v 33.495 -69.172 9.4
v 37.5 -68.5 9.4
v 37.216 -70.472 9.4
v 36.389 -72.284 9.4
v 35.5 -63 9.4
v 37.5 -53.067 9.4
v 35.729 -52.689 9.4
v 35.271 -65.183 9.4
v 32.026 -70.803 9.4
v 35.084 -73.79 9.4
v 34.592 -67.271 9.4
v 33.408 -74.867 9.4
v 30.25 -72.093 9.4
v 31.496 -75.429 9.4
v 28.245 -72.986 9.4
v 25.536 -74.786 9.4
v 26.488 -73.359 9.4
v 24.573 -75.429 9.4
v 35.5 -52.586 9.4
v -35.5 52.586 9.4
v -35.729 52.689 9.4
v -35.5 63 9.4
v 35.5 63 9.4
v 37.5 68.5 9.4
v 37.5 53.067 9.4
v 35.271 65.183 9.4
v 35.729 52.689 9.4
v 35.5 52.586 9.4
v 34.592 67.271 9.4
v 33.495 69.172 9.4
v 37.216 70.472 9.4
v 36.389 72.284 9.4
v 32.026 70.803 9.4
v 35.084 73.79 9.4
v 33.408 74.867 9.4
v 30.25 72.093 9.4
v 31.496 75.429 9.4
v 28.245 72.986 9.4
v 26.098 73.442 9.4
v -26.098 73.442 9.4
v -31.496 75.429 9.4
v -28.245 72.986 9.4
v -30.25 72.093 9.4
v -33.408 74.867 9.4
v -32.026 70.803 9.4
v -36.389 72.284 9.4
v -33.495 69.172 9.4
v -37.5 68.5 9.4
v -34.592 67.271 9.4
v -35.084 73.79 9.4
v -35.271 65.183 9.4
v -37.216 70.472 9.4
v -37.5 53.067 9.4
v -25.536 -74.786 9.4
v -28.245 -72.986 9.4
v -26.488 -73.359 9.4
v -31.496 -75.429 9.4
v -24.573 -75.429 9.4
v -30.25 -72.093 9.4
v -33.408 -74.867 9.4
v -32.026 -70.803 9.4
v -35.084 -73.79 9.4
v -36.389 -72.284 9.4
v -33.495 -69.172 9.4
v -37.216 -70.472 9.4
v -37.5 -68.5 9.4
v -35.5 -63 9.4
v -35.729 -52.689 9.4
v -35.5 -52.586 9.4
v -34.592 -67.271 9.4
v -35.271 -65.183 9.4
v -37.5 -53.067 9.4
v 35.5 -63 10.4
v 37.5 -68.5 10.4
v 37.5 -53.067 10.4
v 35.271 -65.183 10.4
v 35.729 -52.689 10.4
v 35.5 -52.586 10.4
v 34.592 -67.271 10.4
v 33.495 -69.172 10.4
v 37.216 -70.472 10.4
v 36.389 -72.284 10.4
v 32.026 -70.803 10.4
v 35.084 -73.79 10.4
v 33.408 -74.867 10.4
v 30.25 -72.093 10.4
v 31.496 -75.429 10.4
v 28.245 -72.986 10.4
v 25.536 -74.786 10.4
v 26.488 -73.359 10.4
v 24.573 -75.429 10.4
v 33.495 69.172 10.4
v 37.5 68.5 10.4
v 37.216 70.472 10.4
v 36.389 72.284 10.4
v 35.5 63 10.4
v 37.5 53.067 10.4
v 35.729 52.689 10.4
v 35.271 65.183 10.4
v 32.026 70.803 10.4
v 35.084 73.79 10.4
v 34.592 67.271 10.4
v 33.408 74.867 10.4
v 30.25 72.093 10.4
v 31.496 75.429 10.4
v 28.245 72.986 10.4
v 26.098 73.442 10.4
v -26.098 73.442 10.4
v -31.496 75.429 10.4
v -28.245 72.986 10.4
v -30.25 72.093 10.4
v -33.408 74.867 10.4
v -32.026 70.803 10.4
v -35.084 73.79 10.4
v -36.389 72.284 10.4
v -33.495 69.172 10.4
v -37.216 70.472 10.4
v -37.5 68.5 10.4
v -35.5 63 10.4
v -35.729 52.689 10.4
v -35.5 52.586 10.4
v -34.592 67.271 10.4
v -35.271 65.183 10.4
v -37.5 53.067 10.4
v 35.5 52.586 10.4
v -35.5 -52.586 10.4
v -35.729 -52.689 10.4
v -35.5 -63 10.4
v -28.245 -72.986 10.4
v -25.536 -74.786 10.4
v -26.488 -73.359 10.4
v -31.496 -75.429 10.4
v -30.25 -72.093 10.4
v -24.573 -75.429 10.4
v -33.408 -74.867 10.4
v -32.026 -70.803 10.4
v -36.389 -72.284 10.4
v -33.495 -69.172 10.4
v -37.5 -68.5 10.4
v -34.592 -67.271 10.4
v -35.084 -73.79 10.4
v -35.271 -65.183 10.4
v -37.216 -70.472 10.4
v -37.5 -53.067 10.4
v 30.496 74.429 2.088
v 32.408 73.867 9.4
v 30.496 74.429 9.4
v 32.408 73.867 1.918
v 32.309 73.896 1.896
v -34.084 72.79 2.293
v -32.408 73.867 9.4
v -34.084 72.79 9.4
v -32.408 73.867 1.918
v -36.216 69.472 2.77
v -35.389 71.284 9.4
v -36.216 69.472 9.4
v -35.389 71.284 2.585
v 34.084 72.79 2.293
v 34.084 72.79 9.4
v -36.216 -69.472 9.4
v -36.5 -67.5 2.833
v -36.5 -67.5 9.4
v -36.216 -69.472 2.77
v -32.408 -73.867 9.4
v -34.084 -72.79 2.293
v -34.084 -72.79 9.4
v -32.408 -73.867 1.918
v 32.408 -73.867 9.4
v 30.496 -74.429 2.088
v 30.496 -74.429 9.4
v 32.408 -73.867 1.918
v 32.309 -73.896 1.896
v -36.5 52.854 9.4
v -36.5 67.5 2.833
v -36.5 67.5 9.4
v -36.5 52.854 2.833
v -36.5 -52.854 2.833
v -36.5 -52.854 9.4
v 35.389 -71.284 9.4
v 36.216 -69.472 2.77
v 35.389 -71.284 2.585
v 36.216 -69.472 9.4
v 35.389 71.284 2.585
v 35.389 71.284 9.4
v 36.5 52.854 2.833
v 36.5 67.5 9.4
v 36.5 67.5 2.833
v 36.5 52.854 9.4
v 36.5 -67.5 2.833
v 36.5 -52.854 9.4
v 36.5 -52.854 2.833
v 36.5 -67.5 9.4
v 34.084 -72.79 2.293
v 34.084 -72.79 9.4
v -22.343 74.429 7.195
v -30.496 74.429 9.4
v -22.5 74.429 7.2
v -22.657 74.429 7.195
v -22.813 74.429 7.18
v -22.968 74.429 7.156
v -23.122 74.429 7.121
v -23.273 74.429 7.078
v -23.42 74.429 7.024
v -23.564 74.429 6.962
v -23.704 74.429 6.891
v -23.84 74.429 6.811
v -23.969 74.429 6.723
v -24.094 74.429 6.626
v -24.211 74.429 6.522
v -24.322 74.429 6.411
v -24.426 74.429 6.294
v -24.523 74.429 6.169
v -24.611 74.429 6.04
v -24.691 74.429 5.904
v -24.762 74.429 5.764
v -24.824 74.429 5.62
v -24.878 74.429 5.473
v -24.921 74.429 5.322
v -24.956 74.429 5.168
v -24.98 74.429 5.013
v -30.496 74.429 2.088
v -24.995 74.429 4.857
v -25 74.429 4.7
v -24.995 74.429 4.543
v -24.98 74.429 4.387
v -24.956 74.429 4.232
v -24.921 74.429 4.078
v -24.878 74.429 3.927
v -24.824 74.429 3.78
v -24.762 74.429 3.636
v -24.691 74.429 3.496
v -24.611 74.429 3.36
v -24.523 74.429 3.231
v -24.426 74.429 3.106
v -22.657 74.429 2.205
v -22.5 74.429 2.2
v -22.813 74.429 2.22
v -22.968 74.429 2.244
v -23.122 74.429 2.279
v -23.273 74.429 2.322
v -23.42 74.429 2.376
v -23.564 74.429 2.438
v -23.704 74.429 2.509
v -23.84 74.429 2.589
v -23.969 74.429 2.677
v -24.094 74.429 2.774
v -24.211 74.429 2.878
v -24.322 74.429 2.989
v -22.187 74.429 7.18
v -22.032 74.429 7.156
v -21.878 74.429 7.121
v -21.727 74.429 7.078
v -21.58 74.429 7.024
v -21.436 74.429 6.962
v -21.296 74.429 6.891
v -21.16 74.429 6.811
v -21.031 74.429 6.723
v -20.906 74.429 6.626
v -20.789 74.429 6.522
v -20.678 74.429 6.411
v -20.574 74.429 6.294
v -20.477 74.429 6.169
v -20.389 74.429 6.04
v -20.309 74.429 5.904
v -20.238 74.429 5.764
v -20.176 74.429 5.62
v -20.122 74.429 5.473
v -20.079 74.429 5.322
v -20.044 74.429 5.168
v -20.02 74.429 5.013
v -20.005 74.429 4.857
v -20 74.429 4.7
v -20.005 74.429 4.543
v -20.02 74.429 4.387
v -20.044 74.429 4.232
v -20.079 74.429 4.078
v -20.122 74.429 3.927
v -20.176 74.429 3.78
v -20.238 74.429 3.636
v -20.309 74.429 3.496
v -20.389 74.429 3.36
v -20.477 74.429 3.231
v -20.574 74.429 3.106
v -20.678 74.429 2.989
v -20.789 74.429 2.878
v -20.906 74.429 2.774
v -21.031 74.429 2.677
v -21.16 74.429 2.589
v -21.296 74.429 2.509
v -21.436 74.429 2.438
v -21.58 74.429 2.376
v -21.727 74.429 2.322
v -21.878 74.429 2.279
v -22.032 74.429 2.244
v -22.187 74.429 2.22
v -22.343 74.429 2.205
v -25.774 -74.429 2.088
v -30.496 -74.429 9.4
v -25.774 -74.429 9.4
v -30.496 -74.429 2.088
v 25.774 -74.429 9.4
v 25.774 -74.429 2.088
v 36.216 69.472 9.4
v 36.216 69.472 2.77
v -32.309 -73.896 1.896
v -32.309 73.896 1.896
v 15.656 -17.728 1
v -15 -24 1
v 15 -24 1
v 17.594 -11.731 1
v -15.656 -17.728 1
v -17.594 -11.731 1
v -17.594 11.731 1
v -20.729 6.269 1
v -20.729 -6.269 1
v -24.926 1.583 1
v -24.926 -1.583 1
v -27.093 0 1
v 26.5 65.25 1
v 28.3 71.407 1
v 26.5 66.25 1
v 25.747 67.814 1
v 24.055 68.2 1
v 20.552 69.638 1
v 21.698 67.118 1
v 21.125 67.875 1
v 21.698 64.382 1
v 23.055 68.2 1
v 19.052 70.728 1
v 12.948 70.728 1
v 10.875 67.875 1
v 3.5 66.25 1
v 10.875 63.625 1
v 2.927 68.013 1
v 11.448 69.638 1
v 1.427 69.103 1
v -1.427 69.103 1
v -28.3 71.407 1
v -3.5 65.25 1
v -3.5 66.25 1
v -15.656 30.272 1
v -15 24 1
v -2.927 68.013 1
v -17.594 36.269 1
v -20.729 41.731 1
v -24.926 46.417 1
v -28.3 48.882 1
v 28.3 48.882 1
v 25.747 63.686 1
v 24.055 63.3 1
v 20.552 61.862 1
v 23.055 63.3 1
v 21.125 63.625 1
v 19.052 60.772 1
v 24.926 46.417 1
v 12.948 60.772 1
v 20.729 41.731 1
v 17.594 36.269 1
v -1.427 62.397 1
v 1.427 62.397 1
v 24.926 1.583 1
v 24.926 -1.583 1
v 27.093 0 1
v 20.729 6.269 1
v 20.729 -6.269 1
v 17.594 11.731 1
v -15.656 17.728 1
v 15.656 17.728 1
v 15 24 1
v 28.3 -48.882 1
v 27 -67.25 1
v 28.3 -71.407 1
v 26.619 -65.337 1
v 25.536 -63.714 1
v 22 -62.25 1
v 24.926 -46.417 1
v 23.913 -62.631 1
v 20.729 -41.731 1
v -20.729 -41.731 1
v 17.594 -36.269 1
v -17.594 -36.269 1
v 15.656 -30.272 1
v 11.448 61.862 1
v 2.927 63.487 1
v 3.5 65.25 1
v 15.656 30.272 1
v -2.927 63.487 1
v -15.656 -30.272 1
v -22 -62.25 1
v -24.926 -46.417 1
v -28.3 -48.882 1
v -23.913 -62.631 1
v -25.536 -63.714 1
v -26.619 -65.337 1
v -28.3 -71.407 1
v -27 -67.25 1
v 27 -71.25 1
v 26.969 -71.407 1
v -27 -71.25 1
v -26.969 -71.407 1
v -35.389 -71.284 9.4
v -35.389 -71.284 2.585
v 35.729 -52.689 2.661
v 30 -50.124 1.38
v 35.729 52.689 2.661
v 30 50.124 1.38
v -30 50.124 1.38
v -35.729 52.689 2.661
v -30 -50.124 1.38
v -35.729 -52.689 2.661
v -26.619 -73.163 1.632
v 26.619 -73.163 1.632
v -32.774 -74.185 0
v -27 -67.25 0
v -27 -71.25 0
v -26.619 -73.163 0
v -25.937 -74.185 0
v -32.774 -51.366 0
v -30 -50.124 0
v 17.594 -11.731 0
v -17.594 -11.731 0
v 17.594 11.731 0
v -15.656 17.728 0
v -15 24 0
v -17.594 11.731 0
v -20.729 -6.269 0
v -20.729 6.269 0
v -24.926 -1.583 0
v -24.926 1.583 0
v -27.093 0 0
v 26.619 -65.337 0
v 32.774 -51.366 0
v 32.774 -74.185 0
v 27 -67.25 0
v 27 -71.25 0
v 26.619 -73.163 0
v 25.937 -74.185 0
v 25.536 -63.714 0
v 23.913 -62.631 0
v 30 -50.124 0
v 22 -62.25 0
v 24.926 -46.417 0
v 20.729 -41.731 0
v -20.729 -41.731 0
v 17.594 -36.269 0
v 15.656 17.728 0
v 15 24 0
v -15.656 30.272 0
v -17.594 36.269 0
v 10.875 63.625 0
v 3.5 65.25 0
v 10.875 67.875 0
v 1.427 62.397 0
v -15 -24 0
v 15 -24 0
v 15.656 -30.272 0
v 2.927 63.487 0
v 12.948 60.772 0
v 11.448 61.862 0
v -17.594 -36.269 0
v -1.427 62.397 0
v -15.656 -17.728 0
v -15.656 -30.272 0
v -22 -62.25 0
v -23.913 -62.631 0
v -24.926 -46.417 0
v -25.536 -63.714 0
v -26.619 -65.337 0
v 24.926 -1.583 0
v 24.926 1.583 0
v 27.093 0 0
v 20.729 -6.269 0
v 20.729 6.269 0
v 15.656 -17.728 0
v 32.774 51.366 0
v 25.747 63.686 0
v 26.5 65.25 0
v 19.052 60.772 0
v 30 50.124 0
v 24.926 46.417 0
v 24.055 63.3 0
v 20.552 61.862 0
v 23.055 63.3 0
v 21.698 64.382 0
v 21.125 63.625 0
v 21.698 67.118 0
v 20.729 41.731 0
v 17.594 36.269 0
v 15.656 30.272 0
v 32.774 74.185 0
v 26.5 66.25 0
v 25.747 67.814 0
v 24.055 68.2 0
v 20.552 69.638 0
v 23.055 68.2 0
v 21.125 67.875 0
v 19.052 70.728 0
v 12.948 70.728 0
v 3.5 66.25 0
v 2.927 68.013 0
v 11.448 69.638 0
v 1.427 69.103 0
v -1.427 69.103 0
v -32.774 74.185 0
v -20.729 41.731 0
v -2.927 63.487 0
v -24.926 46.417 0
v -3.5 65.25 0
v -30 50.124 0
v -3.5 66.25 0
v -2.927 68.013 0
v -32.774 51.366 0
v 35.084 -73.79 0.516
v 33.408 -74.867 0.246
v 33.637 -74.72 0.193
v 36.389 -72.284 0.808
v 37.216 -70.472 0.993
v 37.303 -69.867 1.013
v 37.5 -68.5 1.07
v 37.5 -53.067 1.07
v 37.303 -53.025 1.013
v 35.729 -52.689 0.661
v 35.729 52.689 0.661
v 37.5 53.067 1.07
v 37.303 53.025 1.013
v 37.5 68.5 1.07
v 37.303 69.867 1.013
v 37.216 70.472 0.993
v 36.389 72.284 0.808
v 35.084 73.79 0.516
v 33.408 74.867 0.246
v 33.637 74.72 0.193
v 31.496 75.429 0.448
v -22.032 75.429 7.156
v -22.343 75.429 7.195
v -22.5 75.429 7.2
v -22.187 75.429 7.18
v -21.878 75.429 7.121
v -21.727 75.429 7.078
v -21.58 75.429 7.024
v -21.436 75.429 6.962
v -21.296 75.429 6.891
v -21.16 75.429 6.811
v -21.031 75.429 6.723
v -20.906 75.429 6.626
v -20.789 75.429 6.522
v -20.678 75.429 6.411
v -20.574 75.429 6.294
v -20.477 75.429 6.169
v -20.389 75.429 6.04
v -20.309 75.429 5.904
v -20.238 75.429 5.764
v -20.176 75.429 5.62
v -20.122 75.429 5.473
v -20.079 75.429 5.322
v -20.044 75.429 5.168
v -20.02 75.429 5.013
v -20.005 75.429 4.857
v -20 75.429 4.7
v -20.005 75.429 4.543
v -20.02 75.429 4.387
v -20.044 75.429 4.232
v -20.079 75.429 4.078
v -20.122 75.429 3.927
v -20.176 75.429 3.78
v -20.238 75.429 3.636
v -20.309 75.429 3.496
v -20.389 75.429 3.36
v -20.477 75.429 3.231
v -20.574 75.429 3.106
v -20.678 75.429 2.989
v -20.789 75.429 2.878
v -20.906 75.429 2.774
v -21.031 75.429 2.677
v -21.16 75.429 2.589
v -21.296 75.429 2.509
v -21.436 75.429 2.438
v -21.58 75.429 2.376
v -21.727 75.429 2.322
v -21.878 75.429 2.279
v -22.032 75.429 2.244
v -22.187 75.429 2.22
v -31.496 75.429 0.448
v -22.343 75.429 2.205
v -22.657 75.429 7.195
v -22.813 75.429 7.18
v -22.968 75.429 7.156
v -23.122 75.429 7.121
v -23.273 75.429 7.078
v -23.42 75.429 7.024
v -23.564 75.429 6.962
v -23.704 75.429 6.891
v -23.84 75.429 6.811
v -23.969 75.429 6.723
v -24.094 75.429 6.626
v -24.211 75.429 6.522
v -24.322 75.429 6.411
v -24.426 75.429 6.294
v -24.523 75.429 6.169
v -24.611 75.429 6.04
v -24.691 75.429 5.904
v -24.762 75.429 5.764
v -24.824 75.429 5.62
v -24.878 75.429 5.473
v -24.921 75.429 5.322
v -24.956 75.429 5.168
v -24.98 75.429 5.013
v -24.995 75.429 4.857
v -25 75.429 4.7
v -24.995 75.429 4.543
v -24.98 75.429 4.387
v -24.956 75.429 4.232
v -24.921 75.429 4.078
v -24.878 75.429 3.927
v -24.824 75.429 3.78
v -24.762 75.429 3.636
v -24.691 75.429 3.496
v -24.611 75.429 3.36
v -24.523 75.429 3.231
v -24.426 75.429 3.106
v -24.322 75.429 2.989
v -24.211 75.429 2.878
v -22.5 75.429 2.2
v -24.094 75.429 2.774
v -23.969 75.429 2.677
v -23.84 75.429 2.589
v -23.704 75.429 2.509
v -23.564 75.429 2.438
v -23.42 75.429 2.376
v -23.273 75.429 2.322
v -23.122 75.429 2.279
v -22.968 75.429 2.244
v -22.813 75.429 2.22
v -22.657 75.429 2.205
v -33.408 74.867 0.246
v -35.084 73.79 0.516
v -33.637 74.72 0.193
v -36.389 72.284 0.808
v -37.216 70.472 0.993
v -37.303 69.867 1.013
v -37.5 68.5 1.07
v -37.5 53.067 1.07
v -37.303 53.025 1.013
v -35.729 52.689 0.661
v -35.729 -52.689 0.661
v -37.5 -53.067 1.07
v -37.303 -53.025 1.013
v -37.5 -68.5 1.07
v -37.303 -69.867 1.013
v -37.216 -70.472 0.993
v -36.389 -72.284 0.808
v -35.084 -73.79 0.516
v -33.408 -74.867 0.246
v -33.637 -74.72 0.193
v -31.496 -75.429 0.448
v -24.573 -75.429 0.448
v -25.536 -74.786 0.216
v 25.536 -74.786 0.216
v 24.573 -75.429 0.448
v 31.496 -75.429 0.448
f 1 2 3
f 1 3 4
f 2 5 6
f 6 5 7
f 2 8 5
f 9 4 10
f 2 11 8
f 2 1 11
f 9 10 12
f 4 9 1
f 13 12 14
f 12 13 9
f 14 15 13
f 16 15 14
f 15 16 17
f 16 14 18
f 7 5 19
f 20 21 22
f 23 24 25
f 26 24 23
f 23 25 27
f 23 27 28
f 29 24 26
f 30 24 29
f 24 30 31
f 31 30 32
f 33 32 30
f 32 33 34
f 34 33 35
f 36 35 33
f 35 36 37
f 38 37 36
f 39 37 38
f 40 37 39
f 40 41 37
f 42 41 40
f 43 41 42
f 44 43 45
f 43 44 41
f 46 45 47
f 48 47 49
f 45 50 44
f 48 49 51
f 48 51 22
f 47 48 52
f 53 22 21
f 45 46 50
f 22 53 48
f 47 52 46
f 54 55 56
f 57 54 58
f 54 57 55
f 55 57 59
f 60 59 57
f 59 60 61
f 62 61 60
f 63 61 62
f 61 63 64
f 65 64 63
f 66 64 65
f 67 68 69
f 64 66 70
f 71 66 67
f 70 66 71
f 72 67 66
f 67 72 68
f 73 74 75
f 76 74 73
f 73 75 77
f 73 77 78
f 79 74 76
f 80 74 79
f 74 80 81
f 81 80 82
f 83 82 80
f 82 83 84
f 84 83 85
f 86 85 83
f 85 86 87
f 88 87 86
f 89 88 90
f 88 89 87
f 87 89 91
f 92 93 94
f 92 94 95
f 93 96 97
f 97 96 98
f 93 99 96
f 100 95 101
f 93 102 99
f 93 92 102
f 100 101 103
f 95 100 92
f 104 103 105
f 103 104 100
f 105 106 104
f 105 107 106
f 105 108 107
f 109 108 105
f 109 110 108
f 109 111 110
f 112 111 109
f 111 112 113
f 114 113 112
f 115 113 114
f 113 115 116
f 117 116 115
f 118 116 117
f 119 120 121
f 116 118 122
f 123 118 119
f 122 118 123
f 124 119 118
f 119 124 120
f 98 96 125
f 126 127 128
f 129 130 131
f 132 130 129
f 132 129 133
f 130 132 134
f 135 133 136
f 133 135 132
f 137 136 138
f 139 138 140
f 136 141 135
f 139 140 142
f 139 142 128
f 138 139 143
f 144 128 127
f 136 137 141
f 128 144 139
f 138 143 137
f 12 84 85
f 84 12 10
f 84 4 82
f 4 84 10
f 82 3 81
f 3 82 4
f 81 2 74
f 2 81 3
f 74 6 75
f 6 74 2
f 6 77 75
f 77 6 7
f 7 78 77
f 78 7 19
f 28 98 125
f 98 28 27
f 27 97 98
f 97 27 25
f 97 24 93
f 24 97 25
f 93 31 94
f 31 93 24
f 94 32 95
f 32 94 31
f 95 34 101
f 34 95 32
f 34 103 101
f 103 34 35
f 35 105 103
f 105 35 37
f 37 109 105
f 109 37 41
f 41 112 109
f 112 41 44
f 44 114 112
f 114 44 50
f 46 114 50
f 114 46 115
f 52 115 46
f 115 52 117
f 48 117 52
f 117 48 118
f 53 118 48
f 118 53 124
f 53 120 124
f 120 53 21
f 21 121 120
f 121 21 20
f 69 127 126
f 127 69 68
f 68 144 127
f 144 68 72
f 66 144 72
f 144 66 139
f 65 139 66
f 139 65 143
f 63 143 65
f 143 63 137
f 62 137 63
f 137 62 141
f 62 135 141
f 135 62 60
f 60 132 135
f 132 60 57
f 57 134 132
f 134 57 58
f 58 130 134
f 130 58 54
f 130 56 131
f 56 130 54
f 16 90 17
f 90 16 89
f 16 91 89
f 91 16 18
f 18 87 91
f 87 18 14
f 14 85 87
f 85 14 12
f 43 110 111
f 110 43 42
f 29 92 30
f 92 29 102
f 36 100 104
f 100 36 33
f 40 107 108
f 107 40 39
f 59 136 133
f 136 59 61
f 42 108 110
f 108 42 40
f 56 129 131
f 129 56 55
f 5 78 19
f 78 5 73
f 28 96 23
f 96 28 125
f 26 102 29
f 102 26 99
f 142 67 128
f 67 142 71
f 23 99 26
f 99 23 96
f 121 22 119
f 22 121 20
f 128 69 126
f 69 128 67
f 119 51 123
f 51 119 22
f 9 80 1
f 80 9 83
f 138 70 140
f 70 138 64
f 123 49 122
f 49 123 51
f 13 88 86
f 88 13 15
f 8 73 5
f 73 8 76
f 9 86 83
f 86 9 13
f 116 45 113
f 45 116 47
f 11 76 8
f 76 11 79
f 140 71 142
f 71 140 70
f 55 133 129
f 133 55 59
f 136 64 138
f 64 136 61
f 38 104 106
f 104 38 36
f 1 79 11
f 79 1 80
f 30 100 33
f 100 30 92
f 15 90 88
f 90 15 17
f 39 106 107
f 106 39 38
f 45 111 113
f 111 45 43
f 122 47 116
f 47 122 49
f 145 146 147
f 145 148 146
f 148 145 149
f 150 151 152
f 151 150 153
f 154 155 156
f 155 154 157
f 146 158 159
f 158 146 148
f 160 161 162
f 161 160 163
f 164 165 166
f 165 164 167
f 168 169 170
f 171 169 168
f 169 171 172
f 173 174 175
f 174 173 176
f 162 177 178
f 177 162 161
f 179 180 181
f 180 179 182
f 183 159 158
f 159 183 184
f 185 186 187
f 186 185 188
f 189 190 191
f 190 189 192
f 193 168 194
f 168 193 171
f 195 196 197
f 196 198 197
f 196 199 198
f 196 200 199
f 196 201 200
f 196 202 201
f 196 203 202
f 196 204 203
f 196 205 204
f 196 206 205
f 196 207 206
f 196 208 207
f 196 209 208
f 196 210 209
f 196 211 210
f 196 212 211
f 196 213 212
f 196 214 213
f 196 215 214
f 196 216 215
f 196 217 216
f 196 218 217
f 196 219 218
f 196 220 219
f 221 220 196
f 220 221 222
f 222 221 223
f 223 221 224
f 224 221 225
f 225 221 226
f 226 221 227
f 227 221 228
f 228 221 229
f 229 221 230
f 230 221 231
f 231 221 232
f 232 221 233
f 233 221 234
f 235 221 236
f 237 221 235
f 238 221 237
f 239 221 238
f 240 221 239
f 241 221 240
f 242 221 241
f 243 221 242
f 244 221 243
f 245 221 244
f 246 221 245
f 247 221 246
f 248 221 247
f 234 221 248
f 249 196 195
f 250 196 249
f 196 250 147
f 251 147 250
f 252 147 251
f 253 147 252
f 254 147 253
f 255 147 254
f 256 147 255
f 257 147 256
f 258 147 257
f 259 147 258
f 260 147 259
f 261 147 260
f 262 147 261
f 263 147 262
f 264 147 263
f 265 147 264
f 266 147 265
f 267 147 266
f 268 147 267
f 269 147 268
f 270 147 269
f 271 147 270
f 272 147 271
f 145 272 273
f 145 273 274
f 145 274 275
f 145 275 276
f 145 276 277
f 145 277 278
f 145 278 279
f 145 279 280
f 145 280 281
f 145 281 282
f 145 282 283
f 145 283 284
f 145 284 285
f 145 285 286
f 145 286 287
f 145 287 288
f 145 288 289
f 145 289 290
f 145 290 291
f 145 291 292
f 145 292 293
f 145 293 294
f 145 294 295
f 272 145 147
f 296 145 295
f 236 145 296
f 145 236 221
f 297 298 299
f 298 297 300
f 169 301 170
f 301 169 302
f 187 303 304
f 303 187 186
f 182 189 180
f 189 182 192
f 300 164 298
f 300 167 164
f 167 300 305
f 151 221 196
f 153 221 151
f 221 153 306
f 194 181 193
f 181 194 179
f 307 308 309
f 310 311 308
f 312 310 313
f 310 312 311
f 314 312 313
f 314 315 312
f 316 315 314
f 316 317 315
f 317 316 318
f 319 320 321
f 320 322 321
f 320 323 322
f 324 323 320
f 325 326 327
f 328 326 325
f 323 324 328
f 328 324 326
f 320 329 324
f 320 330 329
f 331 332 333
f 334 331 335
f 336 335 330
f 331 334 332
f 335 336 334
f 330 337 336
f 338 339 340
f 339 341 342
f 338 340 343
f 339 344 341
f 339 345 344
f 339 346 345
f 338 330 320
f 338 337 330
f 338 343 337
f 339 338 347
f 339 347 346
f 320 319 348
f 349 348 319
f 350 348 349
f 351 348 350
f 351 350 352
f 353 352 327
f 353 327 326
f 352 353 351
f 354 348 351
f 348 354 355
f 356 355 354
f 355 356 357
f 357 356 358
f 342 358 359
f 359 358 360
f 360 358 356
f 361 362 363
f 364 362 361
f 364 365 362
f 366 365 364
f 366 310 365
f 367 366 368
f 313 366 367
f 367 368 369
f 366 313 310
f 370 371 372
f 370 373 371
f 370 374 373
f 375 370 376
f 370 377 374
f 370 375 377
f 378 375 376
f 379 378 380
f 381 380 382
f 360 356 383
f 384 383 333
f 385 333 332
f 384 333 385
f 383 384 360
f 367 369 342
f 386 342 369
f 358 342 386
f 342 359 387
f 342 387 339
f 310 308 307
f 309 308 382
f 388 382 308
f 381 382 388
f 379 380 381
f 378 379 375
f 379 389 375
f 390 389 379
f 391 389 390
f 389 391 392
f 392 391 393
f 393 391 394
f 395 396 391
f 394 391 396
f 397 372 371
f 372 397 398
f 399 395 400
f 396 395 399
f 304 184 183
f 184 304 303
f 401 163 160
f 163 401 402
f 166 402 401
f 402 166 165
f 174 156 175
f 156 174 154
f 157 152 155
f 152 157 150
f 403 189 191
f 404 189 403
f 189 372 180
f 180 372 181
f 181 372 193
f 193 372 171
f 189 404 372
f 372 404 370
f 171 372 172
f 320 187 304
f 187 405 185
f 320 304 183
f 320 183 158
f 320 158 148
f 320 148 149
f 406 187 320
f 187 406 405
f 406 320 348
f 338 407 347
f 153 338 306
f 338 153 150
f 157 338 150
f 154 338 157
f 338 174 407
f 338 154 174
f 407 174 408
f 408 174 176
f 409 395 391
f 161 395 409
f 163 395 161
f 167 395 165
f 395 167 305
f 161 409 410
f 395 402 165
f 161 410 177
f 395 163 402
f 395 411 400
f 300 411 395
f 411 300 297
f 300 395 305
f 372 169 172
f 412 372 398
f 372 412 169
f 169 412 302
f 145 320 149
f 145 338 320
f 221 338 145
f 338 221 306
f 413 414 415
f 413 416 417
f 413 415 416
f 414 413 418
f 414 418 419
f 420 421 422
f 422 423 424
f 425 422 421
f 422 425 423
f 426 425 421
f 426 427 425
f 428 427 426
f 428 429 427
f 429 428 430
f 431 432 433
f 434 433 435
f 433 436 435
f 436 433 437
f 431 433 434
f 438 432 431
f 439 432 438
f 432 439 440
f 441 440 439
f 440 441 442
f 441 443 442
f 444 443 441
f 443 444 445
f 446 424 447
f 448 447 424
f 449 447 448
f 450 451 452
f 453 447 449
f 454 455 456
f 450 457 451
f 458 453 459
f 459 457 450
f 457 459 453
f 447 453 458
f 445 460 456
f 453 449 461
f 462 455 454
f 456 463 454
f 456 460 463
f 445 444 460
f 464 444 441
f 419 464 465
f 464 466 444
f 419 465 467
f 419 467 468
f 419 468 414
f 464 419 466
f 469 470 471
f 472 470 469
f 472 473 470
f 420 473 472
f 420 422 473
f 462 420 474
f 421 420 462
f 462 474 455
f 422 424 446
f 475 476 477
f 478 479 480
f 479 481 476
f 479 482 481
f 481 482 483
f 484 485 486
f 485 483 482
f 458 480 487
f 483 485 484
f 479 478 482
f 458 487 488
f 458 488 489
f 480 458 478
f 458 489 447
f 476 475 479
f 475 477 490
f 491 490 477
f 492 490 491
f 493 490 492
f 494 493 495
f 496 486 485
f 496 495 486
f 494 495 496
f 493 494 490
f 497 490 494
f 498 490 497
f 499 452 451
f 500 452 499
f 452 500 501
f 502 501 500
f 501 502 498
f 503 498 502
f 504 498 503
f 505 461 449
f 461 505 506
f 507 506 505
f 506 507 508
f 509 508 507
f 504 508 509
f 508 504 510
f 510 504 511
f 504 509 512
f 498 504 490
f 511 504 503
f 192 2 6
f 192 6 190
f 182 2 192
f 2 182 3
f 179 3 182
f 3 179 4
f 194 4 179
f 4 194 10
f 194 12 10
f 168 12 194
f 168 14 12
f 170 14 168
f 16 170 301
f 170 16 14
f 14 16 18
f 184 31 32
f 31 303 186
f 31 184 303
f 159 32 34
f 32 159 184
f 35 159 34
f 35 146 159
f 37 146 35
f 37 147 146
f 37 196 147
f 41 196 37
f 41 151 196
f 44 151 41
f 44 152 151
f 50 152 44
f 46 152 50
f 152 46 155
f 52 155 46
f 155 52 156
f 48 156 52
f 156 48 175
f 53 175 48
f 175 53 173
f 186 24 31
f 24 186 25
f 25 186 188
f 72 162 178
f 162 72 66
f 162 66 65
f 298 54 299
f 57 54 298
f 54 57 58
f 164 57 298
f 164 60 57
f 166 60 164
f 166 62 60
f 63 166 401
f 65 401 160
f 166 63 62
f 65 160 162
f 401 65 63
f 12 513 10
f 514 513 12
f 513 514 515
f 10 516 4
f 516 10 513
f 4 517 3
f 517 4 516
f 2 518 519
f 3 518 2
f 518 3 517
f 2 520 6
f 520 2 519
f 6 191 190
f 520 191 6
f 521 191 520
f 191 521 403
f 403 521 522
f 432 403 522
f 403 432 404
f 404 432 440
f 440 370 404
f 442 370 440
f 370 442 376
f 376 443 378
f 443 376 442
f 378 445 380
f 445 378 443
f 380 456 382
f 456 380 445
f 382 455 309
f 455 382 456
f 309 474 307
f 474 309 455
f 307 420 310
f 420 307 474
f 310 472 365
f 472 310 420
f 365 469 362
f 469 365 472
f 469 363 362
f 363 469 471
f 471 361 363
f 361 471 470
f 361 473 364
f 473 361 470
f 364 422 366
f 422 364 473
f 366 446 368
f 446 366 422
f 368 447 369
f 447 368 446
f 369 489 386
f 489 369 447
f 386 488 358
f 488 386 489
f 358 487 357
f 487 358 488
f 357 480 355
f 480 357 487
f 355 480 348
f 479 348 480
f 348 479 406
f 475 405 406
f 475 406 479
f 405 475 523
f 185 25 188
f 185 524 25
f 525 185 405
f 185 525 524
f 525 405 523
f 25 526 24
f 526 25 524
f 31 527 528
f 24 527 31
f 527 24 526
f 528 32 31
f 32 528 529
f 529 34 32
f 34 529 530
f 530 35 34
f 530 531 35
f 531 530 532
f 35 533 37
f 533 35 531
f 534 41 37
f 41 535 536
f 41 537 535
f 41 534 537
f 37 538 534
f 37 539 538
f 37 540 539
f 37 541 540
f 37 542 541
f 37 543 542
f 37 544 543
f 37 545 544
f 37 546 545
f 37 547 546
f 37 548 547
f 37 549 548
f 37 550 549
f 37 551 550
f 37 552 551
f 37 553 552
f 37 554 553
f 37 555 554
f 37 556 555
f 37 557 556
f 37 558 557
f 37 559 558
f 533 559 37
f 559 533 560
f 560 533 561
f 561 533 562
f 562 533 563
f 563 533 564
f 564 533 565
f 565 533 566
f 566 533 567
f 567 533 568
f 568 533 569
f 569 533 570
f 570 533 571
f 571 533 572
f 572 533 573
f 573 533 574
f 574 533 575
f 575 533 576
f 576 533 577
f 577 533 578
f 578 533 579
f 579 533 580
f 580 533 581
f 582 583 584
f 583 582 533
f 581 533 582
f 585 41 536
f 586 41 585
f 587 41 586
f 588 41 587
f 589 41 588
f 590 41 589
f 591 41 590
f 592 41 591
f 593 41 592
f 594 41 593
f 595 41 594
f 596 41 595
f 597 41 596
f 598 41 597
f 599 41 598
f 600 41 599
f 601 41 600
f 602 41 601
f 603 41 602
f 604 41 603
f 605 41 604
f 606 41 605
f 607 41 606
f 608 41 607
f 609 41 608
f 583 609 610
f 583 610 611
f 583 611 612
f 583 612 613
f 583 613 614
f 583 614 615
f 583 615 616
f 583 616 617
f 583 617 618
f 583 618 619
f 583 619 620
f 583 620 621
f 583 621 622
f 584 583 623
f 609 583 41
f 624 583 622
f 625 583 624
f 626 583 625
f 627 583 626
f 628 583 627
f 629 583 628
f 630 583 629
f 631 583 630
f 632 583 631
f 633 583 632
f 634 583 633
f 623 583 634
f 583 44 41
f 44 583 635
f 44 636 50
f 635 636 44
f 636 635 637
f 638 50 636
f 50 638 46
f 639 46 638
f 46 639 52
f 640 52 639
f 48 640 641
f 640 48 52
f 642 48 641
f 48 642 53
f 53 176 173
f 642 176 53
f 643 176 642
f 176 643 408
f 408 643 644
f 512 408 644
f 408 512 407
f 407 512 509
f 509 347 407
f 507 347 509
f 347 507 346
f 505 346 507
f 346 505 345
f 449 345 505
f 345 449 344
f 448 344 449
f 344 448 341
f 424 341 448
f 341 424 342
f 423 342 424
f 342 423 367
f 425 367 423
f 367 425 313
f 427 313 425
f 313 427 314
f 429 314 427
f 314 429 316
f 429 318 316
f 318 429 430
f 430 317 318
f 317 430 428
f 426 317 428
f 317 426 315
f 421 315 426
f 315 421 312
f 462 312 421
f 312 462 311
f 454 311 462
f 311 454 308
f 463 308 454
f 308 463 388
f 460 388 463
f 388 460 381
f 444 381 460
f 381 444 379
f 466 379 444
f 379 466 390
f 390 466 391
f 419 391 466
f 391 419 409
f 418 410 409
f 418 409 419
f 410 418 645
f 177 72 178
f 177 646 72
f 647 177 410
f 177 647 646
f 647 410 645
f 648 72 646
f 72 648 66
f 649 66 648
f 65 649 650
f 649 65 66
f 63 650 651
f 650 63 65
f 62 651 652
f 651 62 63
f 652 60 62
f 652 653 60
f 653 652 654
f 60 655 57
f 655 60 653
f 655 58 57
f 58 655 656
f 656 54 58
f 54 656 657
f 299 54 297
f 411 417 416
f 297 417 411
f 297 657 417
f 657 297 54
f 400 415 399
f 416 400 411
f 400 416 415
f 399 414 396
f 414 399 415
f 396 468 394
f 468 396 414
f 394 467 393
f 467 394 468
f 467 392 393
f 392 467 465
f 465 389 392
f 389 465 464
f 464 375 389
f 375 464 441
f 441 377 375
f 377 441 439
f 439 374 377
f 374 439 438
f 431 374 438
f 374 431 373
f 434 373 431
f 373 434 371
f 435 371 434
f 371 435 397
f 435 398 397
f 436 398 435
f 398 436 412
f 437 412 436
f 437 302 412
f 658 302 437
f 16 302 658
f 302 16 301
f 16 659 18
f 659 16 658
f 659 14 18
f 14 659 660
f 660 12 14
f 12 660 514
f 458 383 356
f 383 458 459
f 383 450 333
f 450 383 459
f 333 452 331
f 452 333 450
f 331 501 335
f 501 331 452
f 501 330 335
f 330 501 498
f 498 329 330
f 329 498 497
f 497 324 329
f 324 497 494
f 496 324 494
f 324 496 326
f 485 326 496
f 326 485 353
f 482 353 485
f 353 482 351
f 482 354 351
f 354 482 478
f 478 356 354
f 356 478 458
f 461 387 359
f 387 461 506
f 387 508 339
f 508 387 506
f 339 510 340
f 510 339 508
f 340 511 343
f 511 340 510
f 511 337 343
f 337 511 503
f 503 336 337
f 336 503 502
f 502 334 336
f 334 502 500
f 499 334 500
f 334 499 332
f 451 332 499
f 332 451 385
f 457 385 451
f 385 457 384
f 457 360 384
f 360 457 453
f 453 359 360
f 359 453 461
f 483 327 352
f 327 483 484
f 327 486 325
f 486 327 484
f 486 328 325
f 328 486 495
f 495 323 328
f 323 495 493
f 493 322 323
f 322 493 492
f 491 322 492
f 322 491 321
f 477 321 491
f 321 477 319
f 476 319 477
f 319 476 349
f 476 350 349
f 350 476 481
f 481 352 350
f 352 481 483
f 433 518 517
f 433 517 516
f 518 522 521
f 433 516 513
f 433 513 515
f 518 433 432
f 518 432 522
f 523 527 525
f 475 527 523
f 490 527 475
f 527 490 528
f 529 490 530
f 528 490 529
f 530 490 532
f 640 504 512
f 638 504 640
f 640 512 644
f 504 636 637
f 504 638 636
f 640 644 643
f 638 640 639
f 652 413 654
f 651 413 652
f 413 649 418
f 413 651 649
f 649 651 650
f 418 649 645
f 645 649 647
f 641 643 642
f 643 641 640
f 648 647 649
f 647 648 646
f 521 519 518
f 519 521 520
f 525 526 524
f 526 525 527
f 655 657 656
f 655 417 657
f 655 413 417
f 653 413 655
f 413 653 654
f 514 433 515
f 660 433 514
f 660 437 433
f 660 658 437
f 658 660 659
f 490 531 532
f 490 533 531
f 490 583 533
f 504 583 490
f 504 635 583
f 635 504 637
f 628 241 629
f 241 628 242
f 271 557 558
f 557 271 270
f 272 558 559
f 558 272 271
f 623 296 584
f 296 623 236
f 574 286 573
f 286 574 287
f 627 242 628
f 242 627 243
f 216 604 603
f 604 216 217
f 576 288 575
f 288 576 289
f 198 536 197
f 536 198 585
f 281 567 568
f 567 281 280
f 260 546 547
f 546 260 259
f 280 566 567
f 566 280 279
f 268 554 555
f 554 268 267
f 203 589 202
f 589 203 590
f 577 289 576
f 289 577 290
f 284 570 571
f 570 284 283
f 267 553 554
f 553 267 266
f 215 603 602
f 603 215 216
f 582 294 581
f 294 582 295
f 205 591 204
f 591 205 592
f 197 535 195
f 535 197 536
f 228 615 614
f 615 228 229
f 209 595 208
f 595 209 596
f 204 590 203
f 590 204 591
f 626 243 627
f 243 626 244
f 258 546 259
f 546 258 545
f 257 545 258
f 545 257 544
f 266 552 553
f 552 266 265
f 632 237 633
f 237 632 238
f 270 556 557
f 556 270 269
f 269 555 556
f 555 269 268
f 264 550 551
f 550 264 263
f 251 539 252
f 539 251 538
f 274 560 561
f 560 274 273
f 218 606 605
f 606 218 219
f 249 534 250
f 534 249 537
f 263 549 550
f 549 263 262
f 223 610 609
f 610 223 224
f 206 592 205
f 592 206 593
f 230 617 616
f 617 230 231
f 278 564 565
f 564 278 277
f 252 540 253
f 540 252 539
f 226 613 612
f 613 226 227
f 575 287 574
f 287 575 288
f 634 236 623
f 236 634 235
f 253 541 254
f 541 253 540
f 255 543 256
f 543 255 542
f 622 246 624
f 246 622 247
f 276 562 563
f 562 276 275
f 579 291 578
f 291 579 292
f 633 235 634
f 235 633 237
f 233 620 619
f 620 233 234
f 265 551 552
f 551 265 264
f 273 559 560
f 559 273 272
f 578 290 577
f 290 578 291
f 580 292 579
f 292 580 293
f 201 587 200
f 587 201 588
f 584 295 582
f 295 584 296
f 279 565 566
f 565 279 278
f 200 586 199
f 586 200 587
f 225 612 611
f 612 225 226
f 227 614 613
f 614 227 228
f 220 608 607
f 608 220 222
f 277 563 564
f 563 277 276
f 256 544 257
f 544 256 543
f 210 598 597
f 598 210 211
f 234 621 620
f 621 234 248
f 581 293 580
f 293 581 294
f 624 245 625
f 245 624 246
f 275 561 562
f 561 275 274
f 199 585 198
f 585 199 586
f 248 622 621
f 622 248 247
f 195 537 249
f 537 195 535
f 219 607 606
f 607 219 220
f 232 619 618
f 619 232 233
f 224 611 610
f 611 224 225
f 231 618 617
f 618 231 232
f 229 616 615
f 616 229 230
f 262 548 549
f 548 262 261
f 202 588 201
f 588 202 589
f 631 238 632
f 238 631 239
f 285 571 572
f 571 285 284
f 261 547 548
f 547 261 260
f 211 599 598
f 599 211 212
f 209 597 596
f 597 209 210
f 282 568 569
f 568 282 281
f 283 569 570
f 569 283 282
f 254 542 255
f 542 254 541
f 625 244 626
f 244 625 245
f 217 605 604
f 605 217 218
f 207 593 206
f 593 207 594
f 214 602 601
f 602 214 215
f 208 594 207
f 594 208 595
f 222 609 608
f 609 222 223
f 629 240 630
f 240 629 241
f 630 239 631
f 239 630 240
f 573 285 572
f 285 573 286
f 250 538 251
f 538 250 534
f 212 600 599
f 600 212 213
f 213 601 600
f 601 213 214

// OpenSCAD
//Rev.1-1 added cutout location parameters
//Rev.1 added IR remote opening, clean up.


//Phone dimensions
//Nubia My Prague
w=73;
l=149;  
d=6.5;
shell_thk=1;
clearance=0.9;  //phone thickness clearance
r=7; //corner rounding radius
cam_hole_width=10.25;
cam_hole_length=10.25;
cam_hole_y=65.75;  //from center of phone
cam_hole_x=16;   //from center of phone
flash_hole_width=5;
flash_hole_length=5;
flash_hole_y=65.75;  //from center of phone
flash_hole_x=24;  //from center of phone

fp_hole_width=7;
fp_hole_length=7;
fp_hole_y=65.75;  //from center of phone
fp_hole_x=0;  //from center of phone
speaker_y=69.25;
IR_x=22.5;

/* Le622
w=75;
l=152;  
d=8;
shell_thk=1;
clearance=1.5;  //phone thickness clearance
r=7; //corner rounding radius
cam_hole_width=17;
cam_hole_length=17;
cam_hole_y=53;  //from center of phone
cam_hole_x=0;   //from center of phone
flash_hole_width=6;
flash_hole_length=6;
flash_hole_y=53;  //from center of phone
flash_hole_x=-13;  //from center of phone

fp_hole_width=14;
fp_hole_length=14;
fp_hole_y=31.5;  //from center of phone
fp_hole_x=0;  //from center of phone
speaker_y=75.5 //from center of phone
IR_x=19;
*/

case_height=d+2*shell_thk+clearance;  

 module round_square(w=75,l=152,r=7){
  minkowski() {
    square([w-2*r,l-2*r],center=true);
    circle(r); 
}}

module right_cutout(){
    d=60; w=60;
 y1=12;x1=45;
 
  translate([x1,y1*2,0])
     resize([d,w])circle(d); //side
     translate([x1,-y1*2,0])
     resize([d,w])circle(d); 
}
 
module 2d_base(){
 thk=1; //shell thickness
 difference(){
 round_square(w=w+2*thk,l=l+2*thk,r=r);
 //square([160,90],center=true);
     right_cutout();
     mirror([1,0,0]) right_cutout();
     translate([cam_hole_x,cam_hole_y,0])  round_square(cam_hole_width,cam_hole_length,r=3);  //camera
     translate([flash_hole_x,flash_hole_y,0])  round_square(flash_hole_width,flash_hole_length,r=2);   //flash
      translate([fp_hole_x,fp_hole_y,0])  round_square(fp_hole_width,fp_hole_length,r=3); //finger print
     translate([0,-speaker_y,0])  round_square(w=54,l=14,r=5); //speaker
 
    }
    }
    
 //phone dim
    module letv622(height=case_height){
   intersection(){
    translate([0,0,0]) linear_extrude(height) round_square(w,l,r);
    translate([0,0,147.3]) rotate([90,0,0])   cylinder(r=150,h=260, $fn=100, center=true);  //side rounding
    translate([0,0,208]) rotate([0,90,0])   cylinder(r=220,h=260, $fn=100, center=true); //top and bottom rounding
   }
   }
   
   
   module shellbase(height=case_height-shell_thk){
   difference(){
      linear_extrude(height)2d_base(); 
      translate([0,0,1])  letv622();
       }
   }

module rim(){
       thk=1;
   rim=2;
   difference(){
        linear_extrude(height=1)2d_base();
         linear_extrude(height=1)
   round_square(w=w-rim,l=l-rim,r=10.5);
   }
   }
   
   module phone_case(){
 difference(){
union(){
  translate([0,0,case_height]) rim();
   intersection(){
   shellbase(height=case_height);
  translate([0,0,147.3-1]) rotate([90,0,0])   cylinder(r=150,h=260, $fn=100, center=true);  //sides rounding
      translate([0,0,208-1]) rotate([0,90,0])   cylinder(r=220,h=260, $fn=100, center=true);  //top and bottom rounding
   }} 
    translate([-IR_x,l/2,case_height/2]) rotate([90,0,0])   cylinder(r=2.5,h=60, $fn=100, center=true);  //IR remote or specker jack
}
}

phone_case();

//debug
    // rim();
   //shellbase();
  // 2d_base();
  
